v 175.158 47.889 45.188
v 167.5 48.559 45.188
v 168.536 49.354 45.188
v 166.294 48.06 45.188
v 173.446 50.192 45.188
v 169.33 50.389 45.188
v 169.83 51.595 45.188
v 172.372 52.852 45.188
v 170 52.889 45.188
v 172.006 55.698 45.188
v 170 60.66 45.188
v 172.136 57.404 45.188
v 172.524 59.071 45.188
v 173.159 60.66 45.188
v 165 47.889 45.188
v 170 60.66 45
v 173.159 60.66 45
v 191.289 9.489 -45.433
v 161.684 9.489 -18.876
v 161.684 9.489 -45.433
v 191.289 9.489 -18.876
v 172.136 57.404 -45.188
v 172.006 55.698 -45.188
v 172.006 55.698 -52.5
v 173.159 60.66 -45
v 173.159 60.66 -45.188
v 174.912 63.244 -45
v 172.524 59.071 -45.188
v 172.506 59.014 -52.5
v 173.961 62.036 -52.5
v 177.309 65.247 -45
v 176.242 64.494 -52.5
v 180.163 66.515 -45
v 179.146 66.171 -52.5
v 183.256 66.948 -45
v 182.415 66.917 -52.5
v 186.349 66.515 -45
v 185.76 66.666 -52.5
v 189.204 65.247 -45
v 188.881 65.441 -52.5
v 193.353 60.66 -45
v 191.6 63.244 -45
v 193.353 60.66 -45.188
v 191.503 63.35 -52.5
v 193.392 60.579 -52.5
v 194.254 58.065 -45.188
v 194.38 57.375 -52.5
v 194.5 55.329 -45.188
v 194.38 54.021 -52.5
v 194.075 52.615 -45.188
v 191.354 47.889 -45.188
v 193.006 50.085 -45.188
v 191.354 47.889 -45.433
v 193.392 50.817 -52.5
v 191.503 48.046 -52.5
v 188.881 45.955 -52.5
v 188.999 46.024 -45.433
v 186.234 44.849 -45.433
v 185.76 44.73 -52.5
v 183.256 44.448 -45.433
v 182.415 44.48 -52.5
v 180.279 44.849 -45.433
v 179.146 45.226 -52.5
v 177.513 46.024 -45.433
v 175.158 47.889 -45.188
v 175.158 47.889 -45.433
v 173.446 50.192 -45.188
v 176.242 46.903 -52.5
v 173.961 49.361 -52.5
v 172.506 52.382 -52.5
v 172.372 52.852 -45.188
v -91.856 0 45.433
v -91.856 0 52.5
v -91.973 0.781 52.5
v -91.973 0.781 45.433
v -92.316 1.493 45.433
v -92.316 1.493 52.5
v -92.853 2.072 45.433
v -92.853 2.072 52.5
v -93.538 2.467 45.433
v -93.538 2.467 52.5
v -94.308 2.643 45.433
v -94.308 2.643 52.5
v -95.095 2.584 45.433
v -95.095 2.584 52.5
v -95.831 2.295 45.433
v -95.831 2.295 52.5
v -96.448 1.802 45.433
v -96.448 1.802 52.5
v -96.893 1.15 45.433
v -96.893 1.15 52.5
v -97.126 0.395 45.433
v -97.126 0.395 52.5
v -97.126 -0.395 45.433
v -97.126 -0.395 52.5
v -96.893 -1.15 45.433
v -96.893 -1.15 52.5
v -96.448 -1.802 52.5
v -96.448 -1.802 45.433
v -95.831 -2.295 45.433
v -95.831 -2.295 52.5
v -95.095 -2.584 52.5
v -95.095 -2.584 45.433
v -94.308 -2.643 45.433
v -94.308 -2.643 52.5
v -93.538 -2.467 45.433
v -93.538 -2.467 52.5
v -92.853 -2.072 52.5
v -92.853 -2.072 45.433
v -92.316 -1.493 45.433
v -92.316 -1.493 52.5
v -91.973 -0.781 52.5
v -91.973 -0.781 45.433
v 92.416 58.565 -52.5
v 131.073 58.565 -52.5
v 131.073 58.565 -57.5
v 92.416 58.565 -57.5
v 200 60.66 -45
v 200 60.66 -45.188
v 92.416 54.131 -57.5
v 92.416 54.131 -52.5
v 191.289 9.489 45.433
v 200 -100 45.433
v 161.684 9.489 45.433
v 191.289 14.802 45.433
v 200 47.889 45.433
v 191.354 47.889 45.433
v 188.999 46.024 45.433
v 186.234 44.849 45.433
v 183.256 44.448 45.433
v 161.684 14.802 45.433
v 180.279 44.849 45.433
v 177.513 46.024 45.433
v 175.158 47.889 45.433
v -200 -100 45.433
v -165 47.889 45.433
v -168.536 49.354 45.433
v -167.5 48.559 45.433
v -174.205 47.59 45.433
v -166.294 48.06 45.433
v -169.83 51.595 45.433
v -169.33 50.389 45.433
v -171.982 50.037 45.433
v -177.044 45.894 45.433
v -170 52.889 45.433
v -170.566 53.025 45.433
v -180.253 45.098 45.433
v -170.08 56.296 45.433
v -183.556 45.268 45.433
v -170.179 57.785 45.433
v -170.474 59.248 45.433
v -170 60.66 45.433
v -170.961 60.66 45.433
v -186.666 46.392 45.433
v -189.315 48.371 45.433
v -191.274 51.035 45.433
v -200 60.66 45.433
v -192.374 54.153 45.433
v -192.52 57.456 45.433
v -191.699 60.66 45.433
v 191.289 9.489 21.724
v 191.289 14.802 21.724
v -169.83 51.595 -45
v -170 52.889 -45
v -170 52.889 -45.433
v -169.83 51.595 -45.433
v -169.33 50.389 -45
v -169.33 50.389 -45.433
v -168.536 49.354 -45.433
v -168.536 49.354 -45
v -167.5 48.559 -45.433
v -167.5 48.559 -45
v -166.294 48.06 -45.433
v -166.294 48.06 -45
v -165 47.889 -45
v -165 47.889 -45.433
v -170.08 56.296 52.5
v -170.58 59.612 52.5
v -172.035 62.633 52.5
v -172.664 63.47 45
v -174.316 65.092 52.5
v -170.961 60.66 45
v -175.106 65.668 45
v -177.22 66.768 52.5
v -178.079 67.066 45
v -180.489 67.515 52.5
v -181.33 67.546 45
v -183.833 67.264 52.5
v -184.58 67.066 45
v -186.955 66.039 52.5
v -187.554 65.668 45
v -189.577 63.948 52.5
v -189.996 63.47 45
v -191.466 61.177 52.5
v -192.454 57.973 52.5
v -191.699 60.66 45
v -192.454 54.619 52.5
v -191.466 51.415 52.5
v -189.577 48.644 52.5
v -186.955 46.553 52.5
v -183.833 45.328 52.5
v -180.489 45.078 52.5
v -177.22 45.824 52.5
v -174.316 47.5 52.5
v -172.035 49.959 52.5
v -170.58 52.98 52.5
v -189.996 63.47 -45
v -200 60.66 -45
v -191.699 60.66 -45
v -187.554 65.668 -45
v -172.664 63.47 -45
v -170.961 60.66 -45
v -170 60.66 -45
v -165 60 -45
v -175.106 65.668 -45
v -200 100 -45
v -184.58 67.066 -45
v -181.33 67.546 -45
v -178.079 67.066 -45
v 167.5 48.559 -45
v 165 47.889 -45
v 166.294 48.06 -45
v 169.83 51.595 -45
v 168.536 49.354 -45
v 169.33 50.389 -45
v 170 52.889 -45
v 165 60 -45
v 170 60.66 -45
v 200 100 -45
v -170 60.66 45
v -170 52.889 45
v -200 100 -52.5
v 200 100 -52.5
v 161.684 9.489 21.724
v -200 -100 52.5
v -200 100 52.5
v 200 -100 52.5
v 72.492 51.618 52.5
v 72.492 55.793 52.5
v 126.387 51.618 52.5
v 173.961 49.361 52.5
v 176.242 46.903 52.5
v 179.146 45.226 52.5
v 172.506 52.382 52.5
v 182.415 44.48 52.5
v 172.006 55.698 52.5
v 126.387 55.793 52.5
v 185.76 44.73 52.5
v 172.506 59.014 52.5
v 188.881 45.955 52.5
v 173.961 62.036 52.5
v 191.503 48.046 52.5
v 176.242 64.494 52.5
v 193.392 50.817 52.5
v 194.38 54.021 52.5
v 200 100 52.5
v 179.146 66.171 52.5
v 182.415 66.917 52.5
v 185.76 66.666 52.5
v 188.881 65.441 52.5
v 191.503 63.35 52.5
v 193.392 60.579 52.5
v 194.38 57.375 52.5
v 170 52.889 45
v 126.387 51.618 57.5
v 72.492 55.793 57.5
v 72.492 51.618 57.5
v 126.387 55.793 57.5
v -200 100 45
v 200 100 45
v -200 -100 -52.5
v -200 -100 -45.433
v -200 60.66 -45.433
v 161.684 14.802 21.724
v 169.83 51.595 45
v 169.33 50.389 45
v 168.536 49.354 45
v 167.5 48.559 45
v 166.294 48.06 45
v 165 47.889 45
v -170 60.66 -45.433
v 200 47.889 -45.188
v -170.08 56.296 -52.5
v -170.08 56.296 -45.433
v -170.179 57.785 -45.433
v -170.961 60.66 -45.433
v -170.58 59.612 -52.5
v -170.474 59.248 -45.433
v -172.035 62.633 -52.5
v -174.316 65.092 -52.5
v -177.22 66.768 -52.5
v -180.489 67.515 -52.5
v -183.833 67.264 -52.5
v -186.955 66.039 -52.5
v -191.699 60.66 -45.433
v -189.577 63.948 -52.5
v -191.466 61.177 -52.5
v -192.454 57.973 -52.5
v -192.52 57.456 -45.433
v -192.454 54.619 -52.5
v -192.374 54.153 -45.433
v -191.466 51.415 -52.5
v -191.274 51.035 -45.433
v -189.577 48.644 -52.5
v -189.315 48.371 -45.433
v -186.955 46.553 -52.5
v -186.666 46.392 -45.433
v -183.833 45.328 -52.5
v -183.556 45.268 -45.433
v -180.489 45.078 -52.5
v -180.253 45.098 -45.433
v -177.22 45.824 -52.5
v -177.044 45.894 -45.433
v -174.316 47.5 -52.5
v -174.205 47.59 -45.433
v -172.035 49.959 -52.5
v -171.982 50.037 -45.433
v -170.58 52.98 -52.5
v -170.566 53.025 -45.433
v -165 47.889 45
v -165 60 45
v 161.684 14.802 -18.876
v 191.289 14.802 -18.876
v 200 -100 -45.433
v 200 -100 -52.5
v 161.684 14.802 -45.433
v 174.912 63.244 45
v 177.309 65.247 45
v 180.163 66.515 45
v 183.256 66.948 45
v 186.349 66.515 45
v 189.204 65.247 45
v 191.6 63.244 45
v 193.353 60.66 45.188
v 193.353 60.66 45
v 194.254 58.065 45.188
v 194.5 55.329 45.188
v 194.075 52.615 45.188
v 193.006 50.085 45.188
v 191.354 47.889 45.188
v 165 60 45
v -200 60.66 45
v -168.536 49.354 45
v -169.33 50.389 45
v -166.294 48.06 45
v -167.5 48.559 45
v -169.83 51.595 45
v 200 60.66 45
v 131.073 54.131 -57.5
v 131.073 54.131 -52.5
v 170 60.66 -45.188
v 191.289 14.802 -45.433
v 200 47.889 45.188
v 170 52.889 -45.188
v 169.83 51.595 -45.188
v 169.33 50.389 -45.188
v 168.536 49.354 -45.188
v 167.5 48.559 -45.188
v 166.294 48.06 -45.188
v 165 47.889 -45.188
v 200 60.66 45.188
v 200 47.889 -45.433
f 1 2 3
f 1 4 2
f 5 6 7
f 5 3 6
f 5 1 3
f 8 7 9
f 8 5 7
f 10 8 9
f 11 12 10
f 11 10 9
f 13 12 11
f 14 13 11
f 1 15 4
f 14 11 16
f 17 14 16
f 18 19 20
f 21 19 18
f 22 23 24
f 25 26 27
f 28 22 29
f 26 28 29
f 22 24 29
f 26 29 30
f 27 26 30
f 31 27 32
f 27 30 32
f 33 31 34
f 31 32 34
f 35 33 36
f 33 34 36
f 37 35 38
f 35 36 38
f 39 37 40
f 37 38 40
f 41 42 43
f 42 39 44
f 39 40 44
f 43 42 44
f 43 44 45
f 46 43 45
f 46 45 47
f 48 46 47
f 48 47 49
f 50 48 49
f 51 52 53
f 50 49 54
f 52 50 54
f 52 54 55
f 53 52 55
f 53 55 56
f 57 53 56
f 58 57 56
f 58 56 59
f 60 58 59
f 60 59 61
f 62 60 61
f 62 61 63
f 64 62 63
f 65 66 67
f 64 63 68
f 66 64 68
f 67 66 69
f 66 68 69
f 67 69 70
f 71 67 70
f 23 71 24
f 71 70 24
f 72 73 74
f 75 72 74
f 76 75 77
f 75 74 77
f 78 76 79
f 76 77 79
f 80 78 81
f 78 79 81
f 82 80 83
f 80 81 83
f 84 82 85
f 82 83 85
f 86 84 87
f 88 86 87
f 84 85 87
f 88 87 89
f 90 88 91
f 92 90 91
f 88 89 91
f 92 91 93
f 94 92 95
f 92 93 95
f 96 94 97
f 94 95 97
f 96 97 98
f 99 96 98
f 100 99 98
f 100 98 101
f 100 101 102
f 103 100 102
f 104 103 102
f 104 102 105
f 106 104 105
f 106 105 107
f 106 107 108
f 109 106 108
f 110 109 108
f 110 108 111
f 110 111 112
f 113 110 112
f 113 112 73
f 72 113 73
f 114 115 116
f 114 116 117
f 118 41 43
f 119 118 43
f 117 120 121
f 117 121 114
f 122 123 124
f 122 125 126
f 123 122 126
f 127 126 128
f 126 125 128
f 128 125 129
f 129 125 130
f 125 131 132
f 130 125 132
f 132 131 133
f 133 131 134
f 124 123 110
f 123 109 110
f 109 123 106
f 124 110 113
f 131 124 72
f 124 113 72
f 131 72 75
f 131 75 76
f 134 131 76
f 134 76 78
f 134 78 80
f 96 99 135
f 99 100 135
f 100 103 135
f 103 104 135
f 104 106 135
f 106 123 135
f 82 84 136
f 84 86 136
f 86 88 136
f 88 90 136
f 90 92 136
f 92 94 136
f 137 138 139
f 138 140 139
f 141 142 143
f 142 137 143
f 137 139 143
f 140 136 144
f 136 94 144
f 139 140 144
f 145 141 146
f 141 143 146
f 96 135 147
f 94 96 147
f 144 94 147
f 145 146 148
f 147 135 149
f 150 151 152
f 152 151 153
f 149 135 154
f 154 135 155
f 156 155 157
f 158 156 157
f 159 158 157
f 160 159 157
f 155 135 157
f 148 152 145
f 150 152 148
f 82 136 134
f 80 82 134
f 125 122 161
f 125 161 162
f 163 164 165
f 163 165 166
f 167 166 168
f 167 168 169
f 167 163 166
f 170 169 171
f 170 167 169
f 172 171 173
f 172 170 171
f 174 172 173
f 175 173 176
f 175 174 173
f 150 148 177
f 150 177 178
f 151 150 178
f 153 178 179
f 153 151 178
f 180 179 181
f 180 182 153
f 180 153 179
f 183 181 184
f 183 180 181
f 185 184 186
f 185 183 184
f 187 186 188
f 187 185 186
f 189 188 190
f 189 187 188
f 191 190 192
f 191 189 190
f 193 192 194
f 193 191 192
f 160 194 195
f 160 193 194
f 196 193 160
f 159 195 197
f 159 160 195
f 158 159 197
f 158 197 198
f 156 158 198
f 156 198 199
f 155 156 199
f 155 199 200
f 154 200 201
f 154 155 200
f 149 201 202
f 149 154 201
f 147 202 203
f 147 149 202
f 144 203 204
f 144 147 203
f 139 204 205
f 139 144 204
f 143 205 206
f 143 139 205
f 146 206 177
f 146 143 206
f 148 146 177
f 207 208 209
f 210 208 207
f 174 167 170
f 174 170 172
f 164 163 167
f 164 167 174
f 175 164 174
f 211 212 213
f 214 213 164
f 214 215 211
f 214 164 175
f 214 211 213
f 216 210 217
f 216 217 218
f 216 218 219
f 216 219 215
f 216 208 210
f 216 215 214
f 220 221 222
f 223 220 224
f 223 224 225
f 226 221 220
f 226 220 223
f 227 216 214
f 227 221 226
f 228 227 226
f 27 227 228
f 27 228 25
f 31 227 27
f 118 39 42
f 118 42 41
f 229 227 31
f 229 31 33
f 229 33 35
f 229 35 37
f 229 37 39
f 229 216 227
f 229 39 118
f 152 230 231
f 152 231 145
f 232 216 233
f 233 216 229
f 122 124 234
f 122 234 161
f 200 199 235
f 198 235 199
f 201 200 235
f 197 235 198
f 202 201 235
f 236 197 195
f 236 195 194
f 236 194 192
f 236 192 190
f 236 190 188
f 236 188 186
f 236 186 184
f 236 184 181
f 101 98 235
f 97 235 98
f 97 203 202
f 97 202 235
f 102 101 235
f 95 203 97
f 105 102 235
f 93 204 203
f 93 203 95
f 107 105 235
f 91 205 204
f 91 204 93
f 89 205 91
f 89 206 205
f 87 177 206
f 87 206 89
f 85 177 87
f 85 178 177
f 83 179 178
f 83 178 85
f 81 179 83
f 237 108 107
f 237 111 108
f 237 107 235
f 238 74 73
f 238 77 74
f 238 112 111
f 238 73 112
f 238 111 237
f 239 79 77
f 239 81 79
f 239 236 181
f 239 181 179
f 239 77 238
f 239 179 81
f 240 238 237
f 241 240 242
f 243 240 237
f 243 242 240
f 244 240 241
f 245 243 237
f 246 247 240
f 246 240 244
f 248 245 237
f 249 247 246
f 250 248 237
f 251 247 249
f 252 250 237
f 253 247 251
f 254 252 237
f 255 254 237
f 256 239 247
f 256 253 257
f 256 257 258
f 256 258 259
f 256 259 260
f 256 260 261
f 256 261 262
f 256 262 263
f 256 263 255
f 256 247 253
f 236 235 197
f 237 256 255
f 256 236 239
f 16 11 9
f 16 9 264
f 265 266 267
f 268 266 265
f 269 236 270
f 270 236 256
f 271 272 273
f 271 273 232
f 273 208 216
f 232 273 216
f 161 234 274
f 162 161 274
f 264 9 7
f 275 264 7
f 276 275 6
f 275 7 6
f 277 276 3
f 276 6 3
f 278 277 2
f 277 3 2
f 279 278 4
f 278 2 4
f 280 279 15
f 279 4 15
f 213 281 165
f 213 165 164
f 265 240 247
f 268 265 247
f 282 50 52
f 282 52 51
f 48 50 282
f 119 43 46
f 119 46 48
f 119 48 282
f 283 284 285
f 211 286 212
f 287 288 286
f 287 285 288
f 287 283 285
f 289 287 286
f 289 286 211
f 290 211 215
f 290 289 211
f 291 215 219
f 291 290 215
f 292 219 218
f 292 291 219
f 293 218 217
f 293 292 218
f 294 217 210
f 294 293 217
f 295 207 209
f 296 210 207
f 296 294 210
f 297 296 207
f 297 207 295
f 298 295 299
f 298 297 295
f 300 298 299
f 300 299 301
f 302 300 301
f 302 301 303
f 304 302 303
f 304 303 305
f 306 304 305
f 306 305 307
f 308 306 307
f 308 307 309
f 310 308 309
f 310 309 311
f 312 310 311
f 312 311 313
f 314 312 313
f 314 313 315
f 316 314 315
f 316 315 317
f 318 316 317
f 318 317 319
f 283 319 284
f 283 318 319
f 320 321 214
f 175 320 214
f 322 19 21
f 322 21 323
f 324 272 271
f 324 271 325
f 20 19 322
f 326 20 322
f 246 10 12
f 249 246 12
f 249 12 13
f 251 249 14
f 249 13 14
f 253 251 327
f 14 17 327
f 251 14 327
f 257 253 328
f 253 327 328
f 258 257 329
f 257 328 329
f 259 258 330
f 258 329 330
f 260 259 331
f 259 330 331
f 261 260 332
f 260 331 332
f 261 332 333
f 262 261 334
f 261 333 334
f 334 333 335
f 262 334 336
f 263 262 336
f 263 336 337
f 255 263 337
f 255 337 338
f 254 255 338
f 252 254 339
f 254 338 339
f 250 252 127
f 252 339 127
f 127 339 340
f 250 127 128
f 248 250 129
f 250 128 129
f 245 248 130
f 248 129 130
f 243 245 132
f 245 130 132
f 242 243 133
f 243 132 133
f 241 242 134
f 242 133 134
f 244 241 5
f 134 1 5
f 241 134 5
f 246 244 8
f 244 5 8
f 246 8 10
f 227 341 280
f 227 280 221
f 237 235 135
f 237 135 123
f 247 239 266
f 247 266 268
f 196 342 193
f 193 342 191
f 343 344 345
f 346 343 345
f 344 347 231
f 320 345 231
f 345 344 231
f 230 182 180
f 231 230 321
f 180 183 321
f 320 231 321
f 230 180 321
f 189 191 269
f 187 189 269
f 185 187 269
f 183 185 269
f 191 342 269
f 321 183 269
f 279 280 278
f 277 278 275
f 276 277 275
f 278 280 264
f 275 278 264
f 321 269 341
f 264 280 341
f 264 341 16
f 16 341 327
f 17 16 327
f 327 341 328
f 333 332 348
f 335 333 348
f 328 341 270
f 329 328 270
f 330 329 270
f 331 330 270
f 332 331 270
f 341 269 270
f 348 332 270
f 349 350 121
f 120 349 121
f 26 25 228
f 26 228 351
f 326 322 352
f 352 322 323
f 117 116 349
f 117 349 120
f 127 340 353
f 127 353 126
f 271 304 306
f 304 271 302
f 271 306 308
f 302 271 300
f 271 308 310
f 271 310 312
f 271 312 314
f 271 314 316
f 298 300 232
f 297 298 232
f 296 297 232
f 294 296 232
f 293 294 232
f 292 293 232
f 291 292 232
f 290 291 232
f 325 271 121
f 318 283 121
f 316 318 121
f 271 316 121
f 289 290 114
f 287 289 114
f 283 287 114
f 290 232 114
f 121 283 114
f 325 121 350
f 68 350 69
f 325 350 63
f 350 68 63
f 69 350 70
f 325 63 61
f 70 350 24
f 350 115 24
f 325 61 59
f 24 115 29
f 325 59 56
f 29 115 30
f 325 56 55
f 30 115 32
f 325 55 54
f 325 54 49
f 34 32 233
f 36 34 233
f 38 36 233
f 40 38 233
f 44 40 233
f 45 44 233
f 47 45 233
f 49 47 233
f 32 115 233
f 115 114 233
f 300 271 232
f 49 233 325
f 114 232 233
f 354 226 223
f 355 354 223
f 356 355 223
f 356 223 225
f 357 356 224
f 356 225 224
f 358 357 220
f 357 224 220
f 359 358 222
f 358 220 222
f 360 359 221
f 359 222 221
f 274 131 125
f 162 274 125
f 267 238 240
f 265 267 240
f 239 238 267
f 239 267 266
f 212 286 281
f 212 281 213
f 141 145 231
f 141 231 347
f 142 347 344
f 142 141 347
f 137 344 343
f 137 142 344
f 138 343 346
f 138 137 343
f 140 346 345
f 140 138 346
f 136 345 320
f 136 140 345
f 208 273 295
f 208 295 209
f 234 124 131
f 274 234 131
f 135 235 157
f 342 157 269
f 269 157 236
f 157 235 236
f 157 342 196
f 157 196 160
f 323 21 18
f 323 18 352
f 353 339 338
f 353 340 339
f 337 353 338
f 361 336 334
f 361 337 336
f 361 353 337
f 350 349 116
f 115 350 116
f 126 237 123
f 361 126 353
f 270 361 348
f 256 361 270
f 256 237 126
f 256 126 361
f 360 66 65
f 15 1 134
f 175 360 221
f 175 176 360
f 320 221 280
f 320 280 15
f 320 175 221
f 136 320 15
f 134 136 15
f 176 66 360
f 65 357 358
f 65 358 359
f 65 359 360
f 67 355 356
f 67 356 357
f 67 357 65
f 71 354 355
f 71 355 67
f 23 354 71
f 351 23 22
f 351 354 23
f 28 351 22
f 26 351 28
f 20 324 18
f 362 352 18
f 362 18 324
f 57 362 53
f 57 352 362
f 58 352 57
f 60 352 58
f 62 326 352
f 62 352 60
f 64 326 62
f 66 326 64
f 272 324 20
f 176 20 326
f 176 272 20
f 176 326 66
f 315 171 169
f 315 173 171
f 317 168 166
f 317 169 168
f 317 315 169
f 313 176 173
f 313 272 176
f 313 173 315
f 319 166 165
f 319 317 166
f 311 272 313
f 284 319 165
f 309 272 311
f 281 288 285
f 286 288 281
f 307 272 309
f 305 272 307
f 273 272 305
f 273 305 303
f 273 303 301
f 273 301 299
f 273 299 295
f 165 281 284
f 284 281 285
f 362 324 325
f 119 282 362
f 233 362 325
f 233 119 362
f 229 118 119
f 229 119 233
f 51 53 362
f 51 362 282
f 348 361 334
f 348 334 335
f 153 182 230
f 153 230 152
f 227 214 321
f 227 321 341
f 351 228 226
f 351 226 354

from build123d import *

# Parameters (mm, degrees)
SKETCH1_W               = 400
SKETCH1_H               = 200
BOSS_EXTRUDE1_DEPTH     = 52.5
SKETCH2_W               = 400
SKETCH2_H               = 90
CUT_EXTRUDE2_DEPTH      = 40
SKETCH3_W               = 90.375416362
SKETCH3_H               = 10.805756305
CUT_EXTRUDE4_DEPTH      = 30
SKETCH6_W               = 90.866587104
SKETCH6_H               = 12.770439269
CUT_EXTRUDE5_DEPTH      = 30
SKETCH7_W               = 90.866587104
SKETCH7_H               = 151.035002888
CUT_EXTRUDE6_DEPTH      = 416.639567414
SKETCH8_W               = 30
SKETCH8_H               = 90.375416362
CUT_EXTRUDE7_DEPTH      = 256.367226621
SKETCH11_R              = 11.25
CUT_EXTRUDE8_DEPTH      = 248.032386541
FILLET6_R               = 5
CUT_EXTRUDE9_DEPTH      = 248.032386541
CUT_EXTRUDE9_DEPTH_BACK = 248.032386541
SKETCH12_R              = 11.25
FILLET7_R               = 5
SKETCH19_W              = 5.960521718
SKETCH19_H              = 90
CUT_EXTRUDE11_DEPTH     = 262.450282081
SKETCH20_W              = 5
SKETCH20_H              = 90
CUT_EXTRUDE12_DEPTH     = 262.450282081
BOSS_EXTRUDE7_REACH     = 249.032
SKETCH29_W              = 29.604200123
SKETCH29_H              = 5.313574381
SKETCH30_W              = 40.6
SKETCH30_H              = 6.563827177
CUT_EXTRUDE16_DEPTH     = 416.639567414
SKETCH31_R              = 2.65
CUT_EXTRUDE17_DEPTH     = 10
SKETCH32_W              = 53.894825864
SKETCH32_H              = 4.174951299
BOSS_EXTRUDE8_DEPTH     = 5
SKETCH33_W              = 38.657413524
SKETCH33_H              = 4.433580482
BOSS_EXTRUDE9_DEPTH     = 5


with BuildPart() as part:
    # Sketch1 → Boss-Extrude1 (new, symmetric)
    with BuildSketch(Plane.XY):
        Rectangle(SKETCH1_W, SKETCH1_H)
    extrude(amount=BOSS_EXTRUDE1_DEPTH, both=True)

    # Sketch2 → Cut-Extrude2 (cut)
    with BuildSketch(Plane(origin=(0, 100, 0), x_dir=(1, 0, 0), z_dir=(0, 1, 0))):
        Rectangle(SKETCH2_W, SKETCH2_H)
    extrude(amount=-CUT_EXTRUDE2_DEPTH, mode=Mode.SUBTRACT)

    # Sketch3 → Cut-Extrude4 (cut)
    with BuildSketch(Plane(origin=(200, 0, 0), x_dir=(0, 0, -1), z_dir=(1, 0, 0))):
        with Locations((0, 55.256708374)):
            Rectangle(SKETCH3_W, SKETCH3_H)
    extrude(amount=-CUT_EXTRUDE4_DEPTH, mode=Mode.SUBTRACT)

    # Sketch6 → Cut-Extrude5 (cut)
    with BuildSketch(Plane.ZY.offset(200)):
        with Locations((0, 54.274366892)):
            Rectangle(SKETCH6_W, SKETCH6_H)
    extrude(amount=-CUT_EXTRUDE5_DEPTH, mode=Mode.SUBTRACT)

    # Sketch7 → Cut-Extrude6 (cut, through all)
    with BuildSketch(Plane.ZY.offset(200)):
        with Locations((0, -27.628354187)):
            Rectangle(SKETCH7_W, SKETCH7_H)
    extrude(amount=-CUT_EXTRUDE6_DEPTH, mode=Mode.SUBTRACT)

    # Sketch8 → Cut-Extrude7 (cut, through all)
    with BuildSketch(Plane(origin=(0, 49.853830221, 0), x_dir=(1, 0, 0), z_dir=(0, 1, 0))):
        with Locations((185, 0)):
            Rectangle(SKETCH8_W, SKETCH8_H)
    extrude(amount=-CUT_EXTRUDE7_DEPTH, mode=Mode.SUBTRACT)

    # Sketch11 → Cut-Extrude8 (cut, through all)
    with BuildSketch(Plane(origin=(0, 0, -52.5), x_dir=(-1, 0, 0), z_dir=(0, 0, -1))):
        with Locations((-183.256148082, 55.698181941)):
            Circle(SKETCH11_R)
    extrude(amount=-CUT_EXTRUDE8_DEPTH, mode=Mode.SUBTRACT)

    # Fillet6
    fillet6_edges = [part.edges().sort_by_distance(p)[0] for p in [
        (-170, 60, 0),
        (-170, 47.889147257, 0),
    ]]
    fillet(fillet6_edges, radius=FILLET6_R)

    # Sketch12 → Cut-Extrude9 (cut, two sides: drawn at the far end of the back side and taken through both)
    with BuildSketch(Plane.XY.offset(52.5).offset(-CUT_EXTRUDE9_DEPTH_BACK)):
        with Locations((-181.329803839, 56.296045727)):
            Circle(SKETCH12_R)
    extrude(amount=CUT_EXTRUDE9_DEPTH + CUT_EXTRUDE9_DEPTH_BACK, mode=Mode.SUBTRACT)

    # Fillet7
    fillet7_edges = [part.edges().sort_by_distance(p)[0] for p in [
        (170, 47.889147257, 0),
        (170, 60, 0),
    ]]
    fillet(fillet7_edges, radius=FILLET7_R)

    # Sketch19 → Cut-Extrude11 (cut, through all)
    with BuildSketch(Plane(origin=(0, 60, 0), x_dir=(1, 0, 0), z_dir=(0, 1, 0))):
        with Locations((-167.980260859, 0)):
            Rectangle(SKETCH19_W, SKETCH19_H)
    extrude(amount=-CUT_EXTRUDE11_DEPTH, mode=Mode.SUBTRACT)

    # Sketch20 → Cut-Extrude12 (cut, through all)
    with BuildSketch(Plane(origin=(0, 60, 0), x_dir=(1, 0, 0), z_dir=(0, 1, 0))):
        with Locations((167.5, 0)):
            Rectangle(SKETCH20_W, SKETCH20_H)
    extrude(amount=-CUT_EXTRUDE12_DEPTH, mode=Mode.SUBTRACT)

    # Sketch29 → Boss-Extrude7 (add, up to next)
    with BuildSketch(Plane.XY.offset(52.5), mode=Mode.PRIVATE) as boss_extrude7_sk1:
        with Locations((176.486577654, 12.14531287)):
            Rectangle(SKETCH29_W, SKETCH29_H)
    boss_extrude7_tool1 = extrude(boss_extrude7_sk1.sketch, amount=-BOSS_EXTRUDE7_REACH, mode=Mode.PRIVATE) - part.part
    add(boss_extrude7_tool1.solids().sort_by_distance((176.486578, 12.145313, 52.5))[0])

    # Sketch30 → Cut-Extrude16 (cut, through all)
    with BuildSketch(Plane(origin=(200, 0, 0), x_dir=(0, 0, -1), z_dir=(1, 0, 0))):
        with Locations((-1.424009181, 12.770439269)):
            Rectangle(SKETCH30_W, SKETCH30_H)
    extrude(amount=-CUT_EXTRUDE16_DEPTH, mode=Mode.SUBTRACT)

    # Sketch31 → Cut-Extrude17 (cut)
    with BuildSketch(Plane.XY.offset(52.5)):
        with Locations((-94.505715776, 0)):
            Circle(SKETCH31_R)
    extrude(amount=-CUT_EXTRUDE17_DEPTH, mode=Mode.SUBTRACT)

    # Sketch32 → Boss-Extrude8 (add)
    with BuildSketch(Plane.XY.offset(52.5)):
        with Locations((99.43974913, 53.705055351)):
            Rectangle(SKETCH32_W, SKETCH32_H)
    extrude(amount=BOSS_EXTRUDE8_DEPTH)

    # Sketch33 → Boss-Extrude9 (add)
    with BuildSketch(Plane(origin=(0, 0, -52.5), x_dir=(-1, 0, 0), z_dir=(0, 0, -1))):
        with Locations((-111.744568027, 56.347904824)):
            Rectangle(SKETCH33_W, SKETCH33_H)
    extrude(amount=BOSS_EXTRUDE9_DEPTH)


solid = part.part
